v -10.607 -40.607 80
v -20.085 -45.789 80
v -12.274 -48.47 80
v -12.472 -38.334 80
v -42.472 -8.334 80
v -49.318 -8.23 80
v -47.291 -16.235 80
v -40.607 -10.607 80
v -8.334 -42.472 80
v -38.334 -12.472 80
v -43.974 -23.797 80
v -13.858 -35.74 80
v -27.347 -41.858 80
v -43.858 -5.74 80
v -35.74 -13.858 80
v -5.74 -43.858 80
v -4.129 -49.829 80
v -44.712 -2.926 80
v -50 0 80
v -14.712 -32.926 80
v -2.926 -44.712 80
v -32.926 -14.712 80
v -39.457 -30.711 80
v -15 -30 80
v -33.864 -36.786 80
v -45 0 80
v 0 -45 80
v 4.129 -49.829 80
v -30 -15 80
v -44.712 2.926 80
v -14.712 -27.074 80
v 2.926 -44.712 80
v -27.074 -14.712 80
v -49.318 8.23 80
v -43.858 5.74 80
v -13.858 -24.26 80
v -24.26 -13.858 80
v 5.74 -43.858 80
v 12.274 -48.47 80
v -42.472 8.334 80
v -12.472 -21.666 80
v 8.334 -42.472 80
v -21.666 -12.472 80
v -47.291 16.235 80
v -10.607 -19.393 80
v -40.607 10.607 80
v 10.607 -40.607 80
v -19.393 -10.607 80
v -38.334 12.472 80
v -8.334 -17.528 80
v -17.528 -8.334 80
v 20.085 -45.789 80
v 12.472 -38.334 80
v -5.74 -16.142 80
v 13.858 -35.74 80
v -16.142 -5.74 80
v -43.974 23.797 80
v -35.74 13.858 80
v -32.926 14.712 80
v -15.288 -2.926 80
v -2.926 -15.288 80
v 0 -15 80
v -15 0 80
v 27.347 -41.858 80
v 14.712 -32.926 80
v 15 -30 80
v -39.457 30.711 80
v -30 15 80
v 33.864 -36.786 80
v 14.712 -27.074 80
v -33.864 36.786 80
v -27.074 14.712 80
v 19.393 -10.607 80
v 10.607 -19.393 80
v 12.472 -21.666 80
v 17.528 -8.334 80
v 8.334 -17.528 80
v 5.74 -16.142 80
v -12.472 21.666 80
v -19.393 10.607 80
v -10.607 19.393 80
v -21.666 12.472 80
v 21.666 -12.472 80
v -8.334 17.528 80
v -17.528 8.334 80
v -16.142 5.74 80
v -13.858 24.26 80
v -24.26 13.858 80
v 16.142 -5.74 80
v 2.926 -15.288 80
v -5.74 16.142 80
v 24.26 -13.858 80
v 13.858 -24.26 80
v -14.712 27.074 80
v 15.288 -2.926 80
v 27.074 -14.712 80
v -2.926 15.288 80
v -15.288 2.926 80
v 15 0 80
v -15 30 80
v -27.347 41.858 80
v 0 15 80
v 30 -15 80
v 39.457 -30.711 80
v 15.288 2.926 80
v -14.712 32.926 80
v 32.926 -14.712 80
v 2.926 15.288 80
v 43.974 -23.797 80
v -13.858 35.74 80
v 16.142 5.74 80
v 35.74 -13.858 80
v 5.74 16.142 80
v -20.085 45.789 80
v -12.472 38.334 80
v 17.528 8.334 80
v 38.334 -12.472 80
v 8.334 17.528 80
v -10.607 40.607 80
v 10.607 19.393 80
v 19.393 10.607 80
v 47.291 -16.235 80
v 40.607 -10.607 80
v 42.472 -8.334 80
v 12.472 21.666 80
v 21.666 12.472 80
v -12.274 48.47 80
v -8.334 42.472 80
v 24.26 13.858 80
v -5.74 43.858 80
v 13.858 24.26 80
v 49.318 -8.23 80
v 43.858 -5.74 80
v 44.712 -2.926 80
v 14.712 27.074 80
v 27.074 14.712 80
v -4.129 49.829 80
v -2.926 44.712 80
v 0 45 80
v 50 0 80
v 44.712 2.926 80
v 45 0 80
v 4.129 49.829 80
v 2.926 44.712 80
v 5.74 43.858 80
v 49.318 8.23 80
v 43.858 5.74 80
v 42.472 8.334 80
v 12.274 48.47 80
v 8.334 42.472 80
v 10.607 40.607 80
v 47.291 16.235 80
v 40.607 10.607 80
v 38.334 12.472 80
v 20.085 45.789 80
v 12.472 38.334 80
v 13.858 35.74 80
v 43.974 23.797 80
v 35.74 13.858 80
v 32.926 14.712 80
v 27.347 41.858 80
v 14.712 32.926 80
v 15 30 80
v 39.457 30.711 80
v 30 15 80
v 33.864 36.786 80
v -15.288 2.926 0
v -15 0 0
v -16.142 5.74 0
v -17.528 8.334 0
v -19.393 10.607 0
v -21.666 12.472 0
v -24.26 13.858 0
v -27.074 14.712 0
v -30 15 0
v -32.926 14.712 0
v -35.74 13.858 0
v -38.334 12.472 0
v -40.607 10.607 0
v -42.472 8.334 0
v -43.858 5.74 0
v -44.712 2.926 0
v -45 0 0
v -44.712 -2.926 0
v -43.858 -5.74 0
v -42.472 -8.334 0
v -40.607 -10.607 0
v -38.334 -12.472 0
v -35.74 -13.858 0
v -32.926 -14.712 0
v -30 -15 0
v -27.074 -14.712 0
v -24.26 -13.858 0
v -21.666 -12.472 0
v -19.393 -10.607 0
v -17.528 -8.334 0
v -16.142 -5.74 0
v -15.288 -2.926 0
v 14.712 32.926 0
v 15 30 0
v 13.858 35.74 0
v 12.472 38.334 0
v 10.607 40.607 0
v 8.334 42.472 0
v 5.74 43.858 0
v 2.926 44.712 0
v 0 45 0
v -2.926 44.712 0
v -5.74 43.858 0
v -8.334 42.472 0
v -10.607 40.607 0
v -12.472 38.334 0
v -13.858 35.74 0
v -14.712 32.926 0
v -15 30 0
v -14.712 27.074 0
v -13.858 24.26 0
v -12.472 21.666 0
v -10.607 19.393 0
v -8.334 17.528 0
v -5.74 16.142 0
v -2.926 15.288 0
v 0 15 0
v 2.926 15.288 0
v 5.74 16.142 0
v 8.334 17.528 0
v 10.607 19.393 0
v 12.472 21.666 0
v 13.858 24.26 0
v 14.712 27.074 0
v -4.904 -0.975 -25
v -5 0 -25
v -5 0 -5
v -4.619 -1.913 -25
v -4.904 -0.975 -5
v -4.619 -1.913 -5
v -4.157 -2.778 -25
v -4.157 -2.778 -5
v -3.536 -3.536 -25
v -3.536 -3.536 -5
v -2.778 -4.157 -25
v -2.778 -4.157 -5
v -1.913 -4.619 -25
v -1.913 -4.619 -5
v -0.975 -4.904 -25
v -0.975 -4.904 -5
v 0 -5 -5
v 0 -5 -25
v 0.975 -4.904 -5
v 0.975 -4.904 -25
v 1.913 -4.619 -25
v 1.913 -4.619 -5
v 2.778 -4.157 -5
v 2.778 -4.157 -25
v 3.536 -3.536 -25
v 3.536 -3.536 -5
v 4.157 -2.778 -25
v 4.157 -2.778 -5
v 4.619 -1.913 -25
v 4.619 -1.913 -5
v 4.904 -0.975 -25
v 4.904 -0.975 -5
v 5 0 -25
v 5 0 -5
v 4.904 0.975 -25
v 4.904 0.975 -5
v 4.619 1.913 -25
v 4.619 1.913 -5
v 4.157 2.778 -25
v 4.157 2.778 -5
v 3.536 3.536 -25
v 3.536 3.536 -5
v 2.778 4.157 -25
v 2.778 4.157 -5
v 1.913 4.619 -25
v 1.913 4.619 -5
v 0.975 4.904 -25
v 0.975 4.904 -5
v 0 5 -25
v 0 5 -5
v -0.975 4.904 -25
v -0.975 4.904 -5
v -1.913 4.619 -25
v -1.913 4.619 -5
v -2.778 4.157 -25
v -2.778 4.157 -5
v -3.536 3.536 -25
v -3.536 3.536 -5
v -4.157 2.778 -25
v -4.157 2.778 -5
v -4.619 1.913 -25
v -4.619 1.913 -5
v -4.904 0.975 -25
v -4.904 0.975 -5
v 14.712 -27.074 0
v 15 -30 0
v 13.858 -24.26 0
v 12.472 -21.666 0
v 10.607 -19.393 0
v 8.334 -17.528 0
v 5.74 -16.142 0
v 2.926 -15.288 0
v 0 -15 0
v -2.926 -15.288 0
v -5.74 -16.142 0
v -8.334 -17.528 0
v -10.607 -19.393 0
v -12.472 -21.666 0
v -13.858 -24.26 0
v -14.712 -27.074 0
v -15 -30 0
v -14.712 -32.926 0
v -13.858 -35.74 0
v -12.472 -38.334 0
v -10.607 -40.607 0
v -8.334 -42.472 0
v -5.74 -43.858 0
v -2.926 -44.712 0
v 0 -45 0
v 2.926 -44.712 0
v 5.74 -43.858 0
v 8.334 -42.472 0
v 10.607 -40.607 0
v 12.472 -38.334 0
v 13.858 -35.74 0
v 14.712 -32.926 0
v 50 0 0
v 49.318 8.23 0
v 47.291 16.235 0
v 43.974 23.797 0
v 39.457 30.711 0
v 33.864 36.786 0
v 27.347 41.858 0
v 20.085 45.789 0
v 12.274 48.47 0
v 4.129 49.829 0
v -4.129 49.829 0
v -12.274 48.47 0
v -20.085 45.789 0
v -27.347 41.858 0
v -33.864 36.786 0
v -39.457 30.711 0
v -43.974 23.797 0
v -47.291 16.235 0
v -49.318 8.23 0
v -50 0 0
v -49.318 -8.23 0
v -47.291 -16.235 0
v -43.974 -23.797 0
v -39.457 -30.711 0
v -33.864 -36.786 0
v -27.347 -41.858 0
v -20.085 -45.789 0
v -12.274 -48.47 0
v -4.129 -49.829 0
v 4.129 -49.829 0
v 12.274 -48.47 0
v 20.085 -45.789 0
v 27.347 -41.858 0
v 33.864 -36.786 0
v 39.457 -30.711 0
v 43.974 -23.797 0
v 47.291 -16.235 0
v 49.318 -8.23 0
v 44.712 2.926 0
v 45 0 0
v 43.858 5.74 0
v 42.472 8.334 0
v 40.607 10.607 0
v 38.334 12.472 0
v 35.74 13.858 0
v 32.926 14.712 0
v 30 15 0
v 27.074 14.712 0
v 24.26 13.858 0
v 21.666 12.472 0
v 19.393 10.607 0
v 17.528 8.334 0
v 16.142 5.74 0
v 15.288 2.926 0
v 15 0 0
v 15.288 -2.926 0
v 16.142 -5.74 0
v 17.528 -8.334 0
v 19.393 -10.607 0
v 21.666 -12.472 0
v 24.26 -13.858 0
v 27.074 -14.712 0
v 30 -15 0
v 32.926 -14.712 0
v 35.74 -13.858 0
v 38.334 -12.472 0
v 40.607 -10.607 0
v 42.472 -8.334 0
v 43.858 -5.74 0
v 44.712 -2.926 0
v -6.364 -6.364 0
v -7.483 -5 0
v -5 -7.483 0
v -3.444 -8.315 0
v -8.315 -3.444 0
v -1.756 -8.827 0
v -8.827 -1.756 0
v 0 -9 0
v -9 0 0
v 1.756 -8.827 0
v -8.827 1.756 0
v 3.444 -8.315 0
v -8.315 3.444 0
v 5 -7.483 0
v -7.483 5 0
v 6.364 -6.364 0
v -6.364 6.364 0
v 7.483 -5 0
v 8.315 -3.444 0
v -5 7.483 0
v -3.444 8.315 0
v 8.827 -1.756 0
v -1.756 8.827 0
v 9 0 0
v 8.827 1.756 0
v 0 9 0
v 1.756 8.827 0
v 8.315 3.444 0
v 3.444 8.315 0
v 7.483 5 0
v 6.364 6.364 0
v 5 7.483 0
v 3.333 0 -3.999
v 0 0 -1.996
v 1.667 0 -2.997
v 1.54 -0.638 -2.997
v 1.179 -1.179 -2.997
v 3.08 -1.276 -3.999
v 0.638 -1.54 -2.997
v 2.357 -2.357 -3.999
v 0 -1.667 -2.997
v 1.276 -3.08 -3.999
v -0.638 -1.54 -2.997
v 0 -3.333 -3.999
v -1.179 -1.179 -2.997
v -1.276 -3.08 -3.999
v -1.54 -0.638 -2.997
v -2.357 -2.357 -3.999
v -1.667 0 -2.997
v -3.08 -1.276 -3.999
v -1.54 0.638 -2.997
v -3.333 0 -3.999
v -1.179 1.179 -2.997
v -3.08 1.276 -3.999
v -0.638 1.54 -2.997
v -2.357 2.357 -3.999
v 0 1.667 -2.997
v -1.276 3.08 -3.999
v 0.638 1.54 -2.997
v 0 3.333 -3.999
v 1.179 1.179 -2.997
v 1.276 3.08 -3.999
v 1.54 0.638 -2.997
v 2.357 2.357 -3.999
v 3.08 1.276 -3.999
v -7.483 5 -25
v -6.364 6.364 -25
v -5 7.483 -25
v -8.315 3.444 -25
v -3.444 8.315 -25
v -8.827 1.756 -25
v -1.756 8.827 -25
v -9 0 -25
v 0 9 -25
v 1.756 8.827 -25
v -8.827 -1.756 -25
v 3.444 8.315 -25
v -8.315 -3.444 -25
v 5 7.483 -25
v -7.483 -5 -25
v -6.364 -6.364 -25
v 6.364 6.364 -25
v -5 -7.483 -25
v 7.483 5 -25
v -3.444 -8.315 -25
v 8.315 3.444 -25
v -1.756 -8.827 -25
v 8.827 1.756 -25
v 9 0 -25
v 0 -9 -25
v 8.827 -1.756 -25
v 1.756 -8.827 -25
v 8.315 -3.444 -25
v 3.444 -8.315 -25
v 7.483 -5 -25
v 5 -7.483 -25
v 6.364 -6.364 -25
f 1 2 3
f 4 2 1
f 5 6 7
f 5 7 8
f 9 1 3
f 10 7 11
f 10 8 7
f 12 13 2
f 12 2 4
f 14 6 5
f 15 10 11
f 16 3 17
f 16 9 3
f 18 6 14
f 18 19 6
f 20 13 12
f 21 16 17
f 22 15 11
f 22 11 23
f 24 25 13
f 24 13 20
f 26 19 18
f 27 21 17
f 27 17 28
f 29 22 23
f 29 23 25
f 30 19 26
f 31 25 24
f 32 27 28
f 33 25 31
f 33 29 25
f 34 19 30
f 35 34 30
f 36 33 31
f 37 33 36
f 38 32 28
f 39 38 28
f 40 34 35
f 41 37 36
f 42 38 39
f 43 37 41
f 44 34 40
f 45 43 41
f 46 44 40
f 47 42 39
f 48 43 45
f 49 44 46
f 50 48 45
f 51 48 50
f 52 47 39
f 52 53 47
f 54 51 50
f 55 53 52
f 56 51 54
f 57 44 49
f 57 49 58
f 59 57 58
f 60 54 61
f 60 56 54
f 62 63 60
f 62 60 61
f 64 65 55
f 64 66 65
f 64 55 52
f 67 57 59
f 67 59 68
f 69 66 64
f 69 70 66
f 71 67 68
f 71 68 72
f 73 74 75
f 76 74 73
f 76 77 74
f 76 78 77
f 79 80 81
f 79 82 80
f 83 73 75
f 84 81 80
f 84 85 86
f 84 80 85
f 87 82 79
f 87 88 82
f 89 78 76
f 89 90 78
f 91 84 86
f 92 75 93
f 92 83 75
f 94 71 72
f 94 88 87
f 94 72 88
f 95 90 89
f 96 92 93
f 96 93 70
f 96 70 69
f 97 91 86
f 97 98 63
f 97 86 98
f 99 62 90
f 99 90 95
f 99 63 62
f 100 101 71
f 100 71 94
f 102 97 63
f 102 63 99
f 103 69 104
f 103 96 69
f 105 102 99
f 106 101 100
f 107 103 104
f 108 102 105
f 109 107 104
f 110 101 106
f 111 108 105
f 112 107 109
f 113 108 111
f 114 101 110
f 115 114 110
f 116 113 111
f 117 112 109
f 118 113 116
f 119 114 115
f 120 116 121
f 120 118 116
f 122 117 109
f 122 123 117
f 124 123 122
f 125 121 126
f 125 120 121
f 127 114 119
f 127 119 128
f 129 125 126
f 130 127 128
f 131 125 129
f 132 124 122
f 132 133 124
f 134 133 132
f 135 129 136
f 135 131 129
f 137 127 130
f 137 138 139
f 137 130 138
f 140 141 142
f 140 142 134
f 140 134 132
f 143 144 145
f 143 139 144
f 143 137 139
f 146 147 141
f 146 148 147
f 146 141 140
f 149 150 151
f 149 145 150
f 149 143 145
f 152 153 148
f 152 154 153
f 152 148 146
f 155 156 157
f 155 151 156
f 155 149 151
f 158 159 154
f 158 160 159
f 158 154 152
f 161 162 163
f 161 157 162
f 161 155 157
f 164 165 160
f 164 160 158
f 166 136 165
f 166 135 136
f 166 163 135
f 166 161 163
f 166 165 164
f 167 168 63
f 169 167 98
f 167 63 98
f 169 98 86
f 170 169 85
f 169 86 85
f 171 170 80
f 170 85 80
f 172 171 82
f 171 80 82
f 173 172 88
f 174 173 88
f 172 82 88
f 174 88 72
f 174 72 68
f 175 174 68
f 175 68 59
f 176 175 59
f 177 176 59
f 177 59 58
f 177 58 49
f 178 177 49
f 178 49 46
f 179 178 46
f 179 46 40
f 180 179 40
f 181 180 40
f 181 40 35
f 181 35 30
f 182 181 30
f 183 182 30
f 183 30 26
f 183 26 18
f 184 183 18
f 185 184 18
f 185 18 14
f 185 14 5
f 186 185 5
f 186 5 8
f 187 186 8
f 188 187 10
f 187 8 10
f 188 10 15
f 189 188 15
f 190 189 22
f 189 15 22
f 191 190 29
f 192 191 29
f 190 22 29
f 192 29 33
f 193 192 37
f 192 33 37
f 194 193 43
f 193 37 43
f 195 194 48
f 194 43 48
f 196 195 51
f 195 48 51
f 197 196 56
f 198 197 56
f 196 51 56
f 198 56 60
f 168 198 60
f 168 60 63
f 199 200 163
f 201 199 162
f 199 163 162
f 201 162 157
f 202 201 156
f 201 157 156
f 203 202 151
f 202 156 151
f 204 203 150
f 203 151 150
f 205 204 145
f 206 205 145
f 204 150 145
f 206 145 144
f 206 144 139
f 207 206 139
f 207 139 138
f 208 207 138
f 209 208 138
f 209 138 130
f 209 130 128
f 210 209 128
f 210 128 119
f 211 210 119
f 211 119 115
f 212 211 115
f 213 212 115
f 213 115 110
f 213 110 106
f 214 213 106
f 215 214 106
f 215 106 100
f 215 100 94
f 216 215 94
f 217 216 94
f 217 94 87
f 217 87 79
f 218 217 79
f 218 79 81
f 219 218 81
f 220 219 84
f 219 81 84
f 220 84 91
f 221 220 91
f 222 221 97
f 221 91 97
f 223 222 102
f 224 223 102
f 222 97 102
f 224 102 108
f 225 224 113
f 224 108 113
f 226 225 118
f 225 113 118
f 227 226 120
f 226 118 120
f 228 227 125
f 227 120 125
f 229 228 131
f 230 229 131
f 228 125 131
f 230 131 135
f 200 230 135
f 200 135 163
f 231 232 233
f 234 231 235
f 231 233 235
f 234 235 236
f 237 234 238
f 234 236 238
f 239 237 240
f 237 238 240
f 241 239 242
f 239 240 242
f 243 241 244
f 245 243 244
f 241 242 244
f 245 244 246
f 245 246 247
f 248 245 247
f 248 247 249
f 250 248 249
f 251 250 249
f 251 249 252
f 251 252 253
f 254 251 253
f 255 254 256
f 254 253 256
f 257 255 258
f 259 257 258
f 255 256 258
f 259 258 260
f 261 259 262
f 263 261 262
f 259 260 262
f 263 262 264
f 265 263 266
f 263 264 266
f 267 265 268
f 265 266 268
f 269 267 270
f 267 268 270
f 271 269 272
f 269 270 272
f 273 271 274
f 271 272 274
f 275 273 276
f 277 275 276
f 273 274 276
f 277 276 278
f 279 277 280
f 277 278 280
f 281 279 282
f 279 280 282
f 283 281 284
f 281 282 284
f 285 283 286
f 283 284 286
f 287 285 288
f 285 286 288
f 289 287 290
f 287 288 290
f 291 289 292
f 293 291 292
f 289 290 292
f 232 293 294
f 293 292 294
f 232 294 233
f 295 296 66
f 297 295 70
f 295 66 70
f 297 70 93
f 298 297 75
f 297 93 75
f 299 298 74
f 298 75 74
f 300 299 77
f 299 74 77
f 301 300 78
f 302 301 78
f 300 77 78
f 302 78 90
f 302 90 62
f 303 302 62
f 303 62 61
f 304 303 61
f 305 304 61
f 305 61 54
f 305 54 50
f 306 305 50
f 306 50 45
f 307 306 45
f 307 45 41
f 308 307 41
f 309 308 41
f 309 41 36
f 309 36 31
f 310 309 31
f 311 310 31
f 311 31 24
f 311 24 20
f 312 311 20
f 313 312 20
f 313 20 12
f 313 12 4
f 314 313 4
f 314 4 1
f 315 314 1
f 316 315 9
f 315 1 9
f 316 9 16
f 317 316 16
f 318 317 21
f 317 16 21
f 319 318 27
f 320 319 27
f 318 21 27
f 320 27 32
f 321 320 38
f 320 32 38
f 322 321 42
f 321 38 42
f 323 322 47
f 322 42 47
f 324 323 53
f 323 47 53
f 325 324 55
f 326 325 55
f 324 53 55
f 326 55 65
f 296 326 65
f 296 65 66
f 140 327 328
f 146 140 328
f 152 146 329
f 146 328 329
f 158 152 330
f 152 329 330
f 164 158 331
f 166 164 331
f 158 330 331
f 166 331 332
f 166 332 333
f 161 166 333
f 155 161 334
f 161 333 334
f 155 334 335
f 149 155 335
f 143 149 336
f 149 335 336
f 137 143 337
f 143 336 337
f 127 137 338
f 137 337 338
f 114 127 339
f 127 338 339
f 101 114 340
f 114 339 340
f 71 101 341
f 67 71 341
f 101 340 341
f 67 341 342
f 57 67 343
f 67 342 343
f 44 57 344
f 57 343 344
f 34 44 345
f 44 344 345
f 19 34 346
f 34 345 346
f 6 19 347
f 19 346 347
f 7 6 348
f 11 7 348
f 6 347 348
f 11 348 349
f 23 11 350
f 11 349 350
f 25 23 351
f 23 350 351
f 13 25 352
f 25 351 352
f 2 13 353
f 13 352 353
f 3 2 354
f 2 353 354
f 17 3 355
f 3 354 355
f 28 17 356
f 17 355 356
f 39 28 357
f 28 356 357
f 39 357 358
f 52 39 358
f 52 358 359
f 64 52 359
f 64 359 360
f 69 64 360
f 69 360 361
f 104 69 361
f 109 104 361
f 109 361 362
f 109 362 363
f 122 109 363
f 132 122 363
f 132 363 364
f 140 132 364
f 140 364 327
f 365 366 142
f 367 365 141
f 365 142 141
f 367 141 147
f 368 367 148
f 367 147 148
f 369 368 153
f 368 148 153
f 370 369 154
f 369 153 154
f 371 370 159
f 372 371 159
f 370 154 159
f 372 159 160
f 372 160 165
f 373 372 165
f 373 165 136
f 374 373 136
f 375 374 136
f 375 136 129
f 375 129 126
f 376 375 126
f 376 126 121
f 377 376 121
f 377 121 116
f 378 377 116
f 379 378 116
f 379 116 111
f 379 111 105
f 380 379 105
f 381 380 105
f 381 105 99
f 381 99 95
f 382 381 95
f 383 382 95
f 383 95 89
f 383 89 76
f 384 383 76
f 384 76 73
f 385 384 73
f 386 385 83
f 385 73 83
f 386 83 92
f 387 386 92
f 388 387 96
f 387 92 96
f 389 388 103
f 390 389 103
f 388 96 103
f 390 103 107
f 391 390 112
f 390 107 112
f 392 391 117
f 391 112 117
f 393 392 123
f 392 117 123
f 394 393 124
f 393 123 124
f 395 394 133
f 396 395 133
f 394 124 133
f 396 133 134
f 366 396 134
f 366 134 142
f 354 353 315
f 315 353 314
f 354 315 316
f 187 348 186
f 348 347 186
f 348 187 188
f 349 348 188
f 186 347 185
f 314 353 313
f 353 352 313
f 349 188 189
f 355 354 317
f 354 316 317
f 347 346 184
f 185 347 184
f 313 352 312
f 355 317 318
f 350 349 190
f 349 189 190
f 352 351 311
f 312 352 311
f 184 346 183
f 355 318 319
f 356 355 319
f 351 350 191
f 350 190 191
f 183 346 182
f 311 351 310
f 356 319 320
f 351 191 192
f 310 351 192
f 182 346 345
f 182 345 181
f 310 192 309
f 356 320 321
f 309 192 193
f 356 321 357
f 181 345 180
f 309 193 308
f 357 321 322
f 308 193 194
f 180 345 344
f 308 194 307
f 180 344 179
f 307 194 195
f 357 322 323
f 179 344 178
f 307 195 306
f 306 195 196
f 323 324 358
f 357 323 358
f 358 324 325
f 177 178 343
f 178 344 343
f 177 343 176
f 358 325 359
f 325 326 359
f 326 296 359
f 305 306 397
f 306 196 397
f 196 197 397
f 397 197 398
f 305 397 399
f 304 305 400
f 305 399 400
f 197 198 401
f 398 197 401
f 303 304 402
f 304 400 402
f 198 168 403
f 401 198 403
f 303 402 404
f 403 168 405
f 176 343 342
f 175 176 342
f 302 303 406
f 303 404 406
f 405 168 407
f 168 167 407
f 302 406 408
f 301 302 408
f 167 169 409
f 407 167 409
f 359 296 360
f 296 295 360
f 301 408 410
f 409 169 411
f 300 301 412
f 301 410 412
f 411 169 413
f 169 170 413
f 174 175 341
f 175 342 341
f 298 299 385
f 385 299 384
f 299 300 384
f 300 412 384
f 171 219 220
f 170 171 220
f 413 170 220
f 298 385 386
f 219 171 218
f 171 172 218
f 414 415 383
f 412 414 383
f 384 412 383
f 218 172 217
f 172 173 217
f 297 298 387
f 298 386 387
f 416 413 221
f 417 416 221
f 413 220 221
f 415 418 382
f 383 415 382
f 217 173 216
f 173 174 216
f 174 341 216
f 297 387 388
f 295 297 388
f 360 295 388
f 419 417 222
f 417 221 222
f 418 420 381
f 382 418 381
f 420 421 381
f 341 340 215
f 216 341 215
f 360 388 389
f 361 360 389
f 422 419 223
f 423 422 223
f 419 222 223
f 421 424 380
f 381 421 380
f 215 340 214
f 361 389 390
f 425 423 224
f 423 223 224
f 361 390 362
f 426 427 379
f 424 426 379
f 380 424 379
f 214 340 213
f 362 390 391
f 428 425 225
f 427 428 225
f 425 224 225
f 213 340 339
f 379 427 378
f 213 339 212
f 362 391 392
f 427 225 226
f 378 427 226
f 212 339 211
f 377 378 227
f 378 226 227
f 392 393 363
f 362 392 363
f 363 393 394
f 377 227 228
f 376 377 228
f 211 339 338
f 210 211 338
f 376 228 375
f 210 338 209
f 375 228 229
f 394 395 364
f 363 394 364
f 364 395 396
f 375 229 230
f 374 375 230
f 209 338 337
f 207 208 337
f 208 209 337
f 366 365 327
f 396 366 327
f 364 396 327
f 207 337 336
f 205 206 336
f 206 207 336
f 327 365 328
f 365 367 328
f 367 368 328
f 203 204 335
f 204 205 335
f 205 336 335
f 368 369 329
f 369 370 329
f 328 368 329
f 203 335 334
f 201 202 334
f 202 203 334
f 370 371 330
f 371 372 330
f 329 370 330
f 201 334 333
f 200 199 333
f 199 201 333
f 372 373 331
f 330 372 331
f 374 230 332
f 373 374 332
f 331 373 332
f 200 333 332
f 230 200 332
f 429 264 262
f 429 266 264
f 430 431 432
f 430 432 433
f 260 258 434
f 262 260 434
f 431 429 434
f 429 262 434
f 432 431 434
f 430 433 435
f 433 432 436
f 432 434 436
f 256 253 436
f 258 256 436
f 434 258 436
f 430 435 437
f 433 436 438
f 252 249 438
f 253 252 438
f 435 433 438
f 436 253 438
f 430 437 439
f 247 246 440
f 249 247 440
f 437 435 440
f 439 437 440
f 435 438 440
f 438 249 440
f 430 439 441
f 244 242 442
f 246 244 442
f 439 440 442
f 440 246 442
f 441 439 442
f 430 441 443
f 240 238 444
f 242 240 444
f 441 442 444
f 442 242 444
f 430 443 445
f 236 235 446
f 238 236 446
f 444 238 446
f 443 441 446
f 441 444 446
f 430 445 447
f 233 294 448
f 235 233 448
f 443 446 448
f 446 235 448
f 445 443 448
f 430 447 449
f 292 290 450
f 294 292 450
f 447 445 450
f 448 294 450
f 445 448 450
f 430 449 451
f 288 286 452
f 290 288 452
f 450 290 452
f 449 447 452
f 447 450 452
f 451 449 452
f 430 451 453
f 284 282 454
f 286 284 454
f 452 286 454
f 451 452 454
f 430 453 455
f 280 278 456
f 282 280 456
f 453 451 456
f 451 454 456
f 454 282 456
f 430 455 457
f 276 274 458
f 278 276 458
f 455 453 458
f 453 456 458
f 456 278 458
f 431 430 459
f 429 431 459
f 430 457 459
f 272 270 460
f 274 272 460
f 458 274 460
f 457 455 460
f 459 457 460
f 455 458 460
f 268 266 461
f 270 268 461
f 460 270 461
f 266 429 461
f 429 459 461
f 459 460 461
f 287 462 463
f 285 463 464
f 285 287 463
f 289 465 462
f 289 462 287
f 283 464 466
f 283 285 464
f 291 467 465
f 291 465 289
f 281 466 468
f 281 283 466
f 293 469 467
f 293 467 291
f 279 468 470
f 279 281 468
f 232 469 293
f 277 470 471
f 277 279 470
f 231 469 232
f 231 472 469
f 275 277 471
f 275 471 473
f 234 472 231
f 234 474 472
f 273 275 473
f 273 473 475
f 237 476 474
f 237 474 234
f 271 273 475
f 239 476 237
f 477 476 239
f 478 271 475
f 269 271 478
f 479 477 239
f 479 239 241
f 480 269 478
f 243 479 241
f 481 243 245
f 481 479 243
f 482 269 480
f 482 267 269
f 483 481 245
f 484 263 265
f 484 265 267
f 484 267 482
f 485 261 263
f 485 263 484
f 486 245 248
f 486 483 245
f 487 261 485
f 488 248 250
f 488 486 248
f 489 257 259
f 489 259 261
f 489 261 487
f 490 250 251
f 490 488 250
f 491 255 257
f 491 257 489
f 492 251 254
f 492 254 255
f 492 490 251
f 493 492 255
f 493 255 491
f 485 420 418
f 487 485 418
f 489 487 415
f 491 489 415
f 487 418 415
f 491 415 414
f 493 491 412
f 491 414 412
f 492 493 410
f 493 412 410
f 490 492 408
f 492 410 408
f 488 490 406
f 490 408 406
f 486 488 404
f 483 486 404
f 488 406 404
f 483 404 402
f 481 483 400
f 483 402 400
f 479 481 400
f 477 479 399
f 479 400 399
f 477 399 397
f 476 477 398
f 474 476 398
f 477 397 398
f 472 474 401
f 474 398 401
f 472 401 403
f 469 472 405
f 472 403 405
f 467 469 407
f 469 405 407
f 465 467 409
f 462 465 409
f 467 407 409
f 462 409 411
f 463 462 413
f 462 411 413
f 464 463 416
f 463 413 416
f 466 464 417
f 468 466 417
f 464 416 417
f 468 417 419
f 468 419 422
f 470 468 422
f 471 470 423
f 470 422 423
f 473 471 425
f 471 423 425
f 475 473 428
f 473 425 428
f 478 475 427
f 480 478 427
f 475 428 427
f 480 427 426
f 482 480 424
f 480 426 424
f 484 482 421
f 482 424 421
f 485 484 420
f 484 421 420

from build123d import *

# Parameters (mm, degrees)
F0_R     = 50
F1_DEPTH = 80
F2_R     = 15
F3_DEPTH = 80.001
F4_R     = 9
F5_DEPTH = 25
F7_D     = 10
F7_DEPTH = 20
F7_TIP   = 3.0043030951


with BuildPart() as f1:
    # F0 (on Top) → F1 (new body)
    with BuildSketch(Plane.XY):
        Circle(F0_R)
    extrude(amount=F1_DEPTH)

    # F2 (on face) → F3 (cut, through all)
    with BuildSketch(Plane.XY.offset(80)):
        with Locations((0, 30)):
            Circle(F2_R)
        with Locations((-30, 0)):
            Circle(F2_R)
        with Locations((0, -30)):
            Circle(F2_R)
        with Locations((30, 0)):
            Circle(F2_R)
    extrude(amount=-F3_DEPTH, mode=Mode.SUBTRACT)

    # F4 (on face) → F5 (join)
    with BuildSketch(Plane(origin=(0, 0, 0), x_dir=(1, 0, 0), z_dir=(0, 0, -1))):
        Circle(F4_R)
    extrude(amount=F5_DEPTH)

    # F7
    with Locations(Plane(origin=(0, 0, -25), x_dir=(1, 0, 0), z_dir=(0, 0, -1))):
        with Locations((0, 0)):
            Hole(F7_D / 2, depth=F7_DEPTH)
            with Locations((0, 0, -(F7_DEPTH + F7_TIP / 2))):  # 118° drill point
                Cone(0, F7_D / 2, F7_TIP, mode=Mode.SUBTRACT)


solid = f1.part
